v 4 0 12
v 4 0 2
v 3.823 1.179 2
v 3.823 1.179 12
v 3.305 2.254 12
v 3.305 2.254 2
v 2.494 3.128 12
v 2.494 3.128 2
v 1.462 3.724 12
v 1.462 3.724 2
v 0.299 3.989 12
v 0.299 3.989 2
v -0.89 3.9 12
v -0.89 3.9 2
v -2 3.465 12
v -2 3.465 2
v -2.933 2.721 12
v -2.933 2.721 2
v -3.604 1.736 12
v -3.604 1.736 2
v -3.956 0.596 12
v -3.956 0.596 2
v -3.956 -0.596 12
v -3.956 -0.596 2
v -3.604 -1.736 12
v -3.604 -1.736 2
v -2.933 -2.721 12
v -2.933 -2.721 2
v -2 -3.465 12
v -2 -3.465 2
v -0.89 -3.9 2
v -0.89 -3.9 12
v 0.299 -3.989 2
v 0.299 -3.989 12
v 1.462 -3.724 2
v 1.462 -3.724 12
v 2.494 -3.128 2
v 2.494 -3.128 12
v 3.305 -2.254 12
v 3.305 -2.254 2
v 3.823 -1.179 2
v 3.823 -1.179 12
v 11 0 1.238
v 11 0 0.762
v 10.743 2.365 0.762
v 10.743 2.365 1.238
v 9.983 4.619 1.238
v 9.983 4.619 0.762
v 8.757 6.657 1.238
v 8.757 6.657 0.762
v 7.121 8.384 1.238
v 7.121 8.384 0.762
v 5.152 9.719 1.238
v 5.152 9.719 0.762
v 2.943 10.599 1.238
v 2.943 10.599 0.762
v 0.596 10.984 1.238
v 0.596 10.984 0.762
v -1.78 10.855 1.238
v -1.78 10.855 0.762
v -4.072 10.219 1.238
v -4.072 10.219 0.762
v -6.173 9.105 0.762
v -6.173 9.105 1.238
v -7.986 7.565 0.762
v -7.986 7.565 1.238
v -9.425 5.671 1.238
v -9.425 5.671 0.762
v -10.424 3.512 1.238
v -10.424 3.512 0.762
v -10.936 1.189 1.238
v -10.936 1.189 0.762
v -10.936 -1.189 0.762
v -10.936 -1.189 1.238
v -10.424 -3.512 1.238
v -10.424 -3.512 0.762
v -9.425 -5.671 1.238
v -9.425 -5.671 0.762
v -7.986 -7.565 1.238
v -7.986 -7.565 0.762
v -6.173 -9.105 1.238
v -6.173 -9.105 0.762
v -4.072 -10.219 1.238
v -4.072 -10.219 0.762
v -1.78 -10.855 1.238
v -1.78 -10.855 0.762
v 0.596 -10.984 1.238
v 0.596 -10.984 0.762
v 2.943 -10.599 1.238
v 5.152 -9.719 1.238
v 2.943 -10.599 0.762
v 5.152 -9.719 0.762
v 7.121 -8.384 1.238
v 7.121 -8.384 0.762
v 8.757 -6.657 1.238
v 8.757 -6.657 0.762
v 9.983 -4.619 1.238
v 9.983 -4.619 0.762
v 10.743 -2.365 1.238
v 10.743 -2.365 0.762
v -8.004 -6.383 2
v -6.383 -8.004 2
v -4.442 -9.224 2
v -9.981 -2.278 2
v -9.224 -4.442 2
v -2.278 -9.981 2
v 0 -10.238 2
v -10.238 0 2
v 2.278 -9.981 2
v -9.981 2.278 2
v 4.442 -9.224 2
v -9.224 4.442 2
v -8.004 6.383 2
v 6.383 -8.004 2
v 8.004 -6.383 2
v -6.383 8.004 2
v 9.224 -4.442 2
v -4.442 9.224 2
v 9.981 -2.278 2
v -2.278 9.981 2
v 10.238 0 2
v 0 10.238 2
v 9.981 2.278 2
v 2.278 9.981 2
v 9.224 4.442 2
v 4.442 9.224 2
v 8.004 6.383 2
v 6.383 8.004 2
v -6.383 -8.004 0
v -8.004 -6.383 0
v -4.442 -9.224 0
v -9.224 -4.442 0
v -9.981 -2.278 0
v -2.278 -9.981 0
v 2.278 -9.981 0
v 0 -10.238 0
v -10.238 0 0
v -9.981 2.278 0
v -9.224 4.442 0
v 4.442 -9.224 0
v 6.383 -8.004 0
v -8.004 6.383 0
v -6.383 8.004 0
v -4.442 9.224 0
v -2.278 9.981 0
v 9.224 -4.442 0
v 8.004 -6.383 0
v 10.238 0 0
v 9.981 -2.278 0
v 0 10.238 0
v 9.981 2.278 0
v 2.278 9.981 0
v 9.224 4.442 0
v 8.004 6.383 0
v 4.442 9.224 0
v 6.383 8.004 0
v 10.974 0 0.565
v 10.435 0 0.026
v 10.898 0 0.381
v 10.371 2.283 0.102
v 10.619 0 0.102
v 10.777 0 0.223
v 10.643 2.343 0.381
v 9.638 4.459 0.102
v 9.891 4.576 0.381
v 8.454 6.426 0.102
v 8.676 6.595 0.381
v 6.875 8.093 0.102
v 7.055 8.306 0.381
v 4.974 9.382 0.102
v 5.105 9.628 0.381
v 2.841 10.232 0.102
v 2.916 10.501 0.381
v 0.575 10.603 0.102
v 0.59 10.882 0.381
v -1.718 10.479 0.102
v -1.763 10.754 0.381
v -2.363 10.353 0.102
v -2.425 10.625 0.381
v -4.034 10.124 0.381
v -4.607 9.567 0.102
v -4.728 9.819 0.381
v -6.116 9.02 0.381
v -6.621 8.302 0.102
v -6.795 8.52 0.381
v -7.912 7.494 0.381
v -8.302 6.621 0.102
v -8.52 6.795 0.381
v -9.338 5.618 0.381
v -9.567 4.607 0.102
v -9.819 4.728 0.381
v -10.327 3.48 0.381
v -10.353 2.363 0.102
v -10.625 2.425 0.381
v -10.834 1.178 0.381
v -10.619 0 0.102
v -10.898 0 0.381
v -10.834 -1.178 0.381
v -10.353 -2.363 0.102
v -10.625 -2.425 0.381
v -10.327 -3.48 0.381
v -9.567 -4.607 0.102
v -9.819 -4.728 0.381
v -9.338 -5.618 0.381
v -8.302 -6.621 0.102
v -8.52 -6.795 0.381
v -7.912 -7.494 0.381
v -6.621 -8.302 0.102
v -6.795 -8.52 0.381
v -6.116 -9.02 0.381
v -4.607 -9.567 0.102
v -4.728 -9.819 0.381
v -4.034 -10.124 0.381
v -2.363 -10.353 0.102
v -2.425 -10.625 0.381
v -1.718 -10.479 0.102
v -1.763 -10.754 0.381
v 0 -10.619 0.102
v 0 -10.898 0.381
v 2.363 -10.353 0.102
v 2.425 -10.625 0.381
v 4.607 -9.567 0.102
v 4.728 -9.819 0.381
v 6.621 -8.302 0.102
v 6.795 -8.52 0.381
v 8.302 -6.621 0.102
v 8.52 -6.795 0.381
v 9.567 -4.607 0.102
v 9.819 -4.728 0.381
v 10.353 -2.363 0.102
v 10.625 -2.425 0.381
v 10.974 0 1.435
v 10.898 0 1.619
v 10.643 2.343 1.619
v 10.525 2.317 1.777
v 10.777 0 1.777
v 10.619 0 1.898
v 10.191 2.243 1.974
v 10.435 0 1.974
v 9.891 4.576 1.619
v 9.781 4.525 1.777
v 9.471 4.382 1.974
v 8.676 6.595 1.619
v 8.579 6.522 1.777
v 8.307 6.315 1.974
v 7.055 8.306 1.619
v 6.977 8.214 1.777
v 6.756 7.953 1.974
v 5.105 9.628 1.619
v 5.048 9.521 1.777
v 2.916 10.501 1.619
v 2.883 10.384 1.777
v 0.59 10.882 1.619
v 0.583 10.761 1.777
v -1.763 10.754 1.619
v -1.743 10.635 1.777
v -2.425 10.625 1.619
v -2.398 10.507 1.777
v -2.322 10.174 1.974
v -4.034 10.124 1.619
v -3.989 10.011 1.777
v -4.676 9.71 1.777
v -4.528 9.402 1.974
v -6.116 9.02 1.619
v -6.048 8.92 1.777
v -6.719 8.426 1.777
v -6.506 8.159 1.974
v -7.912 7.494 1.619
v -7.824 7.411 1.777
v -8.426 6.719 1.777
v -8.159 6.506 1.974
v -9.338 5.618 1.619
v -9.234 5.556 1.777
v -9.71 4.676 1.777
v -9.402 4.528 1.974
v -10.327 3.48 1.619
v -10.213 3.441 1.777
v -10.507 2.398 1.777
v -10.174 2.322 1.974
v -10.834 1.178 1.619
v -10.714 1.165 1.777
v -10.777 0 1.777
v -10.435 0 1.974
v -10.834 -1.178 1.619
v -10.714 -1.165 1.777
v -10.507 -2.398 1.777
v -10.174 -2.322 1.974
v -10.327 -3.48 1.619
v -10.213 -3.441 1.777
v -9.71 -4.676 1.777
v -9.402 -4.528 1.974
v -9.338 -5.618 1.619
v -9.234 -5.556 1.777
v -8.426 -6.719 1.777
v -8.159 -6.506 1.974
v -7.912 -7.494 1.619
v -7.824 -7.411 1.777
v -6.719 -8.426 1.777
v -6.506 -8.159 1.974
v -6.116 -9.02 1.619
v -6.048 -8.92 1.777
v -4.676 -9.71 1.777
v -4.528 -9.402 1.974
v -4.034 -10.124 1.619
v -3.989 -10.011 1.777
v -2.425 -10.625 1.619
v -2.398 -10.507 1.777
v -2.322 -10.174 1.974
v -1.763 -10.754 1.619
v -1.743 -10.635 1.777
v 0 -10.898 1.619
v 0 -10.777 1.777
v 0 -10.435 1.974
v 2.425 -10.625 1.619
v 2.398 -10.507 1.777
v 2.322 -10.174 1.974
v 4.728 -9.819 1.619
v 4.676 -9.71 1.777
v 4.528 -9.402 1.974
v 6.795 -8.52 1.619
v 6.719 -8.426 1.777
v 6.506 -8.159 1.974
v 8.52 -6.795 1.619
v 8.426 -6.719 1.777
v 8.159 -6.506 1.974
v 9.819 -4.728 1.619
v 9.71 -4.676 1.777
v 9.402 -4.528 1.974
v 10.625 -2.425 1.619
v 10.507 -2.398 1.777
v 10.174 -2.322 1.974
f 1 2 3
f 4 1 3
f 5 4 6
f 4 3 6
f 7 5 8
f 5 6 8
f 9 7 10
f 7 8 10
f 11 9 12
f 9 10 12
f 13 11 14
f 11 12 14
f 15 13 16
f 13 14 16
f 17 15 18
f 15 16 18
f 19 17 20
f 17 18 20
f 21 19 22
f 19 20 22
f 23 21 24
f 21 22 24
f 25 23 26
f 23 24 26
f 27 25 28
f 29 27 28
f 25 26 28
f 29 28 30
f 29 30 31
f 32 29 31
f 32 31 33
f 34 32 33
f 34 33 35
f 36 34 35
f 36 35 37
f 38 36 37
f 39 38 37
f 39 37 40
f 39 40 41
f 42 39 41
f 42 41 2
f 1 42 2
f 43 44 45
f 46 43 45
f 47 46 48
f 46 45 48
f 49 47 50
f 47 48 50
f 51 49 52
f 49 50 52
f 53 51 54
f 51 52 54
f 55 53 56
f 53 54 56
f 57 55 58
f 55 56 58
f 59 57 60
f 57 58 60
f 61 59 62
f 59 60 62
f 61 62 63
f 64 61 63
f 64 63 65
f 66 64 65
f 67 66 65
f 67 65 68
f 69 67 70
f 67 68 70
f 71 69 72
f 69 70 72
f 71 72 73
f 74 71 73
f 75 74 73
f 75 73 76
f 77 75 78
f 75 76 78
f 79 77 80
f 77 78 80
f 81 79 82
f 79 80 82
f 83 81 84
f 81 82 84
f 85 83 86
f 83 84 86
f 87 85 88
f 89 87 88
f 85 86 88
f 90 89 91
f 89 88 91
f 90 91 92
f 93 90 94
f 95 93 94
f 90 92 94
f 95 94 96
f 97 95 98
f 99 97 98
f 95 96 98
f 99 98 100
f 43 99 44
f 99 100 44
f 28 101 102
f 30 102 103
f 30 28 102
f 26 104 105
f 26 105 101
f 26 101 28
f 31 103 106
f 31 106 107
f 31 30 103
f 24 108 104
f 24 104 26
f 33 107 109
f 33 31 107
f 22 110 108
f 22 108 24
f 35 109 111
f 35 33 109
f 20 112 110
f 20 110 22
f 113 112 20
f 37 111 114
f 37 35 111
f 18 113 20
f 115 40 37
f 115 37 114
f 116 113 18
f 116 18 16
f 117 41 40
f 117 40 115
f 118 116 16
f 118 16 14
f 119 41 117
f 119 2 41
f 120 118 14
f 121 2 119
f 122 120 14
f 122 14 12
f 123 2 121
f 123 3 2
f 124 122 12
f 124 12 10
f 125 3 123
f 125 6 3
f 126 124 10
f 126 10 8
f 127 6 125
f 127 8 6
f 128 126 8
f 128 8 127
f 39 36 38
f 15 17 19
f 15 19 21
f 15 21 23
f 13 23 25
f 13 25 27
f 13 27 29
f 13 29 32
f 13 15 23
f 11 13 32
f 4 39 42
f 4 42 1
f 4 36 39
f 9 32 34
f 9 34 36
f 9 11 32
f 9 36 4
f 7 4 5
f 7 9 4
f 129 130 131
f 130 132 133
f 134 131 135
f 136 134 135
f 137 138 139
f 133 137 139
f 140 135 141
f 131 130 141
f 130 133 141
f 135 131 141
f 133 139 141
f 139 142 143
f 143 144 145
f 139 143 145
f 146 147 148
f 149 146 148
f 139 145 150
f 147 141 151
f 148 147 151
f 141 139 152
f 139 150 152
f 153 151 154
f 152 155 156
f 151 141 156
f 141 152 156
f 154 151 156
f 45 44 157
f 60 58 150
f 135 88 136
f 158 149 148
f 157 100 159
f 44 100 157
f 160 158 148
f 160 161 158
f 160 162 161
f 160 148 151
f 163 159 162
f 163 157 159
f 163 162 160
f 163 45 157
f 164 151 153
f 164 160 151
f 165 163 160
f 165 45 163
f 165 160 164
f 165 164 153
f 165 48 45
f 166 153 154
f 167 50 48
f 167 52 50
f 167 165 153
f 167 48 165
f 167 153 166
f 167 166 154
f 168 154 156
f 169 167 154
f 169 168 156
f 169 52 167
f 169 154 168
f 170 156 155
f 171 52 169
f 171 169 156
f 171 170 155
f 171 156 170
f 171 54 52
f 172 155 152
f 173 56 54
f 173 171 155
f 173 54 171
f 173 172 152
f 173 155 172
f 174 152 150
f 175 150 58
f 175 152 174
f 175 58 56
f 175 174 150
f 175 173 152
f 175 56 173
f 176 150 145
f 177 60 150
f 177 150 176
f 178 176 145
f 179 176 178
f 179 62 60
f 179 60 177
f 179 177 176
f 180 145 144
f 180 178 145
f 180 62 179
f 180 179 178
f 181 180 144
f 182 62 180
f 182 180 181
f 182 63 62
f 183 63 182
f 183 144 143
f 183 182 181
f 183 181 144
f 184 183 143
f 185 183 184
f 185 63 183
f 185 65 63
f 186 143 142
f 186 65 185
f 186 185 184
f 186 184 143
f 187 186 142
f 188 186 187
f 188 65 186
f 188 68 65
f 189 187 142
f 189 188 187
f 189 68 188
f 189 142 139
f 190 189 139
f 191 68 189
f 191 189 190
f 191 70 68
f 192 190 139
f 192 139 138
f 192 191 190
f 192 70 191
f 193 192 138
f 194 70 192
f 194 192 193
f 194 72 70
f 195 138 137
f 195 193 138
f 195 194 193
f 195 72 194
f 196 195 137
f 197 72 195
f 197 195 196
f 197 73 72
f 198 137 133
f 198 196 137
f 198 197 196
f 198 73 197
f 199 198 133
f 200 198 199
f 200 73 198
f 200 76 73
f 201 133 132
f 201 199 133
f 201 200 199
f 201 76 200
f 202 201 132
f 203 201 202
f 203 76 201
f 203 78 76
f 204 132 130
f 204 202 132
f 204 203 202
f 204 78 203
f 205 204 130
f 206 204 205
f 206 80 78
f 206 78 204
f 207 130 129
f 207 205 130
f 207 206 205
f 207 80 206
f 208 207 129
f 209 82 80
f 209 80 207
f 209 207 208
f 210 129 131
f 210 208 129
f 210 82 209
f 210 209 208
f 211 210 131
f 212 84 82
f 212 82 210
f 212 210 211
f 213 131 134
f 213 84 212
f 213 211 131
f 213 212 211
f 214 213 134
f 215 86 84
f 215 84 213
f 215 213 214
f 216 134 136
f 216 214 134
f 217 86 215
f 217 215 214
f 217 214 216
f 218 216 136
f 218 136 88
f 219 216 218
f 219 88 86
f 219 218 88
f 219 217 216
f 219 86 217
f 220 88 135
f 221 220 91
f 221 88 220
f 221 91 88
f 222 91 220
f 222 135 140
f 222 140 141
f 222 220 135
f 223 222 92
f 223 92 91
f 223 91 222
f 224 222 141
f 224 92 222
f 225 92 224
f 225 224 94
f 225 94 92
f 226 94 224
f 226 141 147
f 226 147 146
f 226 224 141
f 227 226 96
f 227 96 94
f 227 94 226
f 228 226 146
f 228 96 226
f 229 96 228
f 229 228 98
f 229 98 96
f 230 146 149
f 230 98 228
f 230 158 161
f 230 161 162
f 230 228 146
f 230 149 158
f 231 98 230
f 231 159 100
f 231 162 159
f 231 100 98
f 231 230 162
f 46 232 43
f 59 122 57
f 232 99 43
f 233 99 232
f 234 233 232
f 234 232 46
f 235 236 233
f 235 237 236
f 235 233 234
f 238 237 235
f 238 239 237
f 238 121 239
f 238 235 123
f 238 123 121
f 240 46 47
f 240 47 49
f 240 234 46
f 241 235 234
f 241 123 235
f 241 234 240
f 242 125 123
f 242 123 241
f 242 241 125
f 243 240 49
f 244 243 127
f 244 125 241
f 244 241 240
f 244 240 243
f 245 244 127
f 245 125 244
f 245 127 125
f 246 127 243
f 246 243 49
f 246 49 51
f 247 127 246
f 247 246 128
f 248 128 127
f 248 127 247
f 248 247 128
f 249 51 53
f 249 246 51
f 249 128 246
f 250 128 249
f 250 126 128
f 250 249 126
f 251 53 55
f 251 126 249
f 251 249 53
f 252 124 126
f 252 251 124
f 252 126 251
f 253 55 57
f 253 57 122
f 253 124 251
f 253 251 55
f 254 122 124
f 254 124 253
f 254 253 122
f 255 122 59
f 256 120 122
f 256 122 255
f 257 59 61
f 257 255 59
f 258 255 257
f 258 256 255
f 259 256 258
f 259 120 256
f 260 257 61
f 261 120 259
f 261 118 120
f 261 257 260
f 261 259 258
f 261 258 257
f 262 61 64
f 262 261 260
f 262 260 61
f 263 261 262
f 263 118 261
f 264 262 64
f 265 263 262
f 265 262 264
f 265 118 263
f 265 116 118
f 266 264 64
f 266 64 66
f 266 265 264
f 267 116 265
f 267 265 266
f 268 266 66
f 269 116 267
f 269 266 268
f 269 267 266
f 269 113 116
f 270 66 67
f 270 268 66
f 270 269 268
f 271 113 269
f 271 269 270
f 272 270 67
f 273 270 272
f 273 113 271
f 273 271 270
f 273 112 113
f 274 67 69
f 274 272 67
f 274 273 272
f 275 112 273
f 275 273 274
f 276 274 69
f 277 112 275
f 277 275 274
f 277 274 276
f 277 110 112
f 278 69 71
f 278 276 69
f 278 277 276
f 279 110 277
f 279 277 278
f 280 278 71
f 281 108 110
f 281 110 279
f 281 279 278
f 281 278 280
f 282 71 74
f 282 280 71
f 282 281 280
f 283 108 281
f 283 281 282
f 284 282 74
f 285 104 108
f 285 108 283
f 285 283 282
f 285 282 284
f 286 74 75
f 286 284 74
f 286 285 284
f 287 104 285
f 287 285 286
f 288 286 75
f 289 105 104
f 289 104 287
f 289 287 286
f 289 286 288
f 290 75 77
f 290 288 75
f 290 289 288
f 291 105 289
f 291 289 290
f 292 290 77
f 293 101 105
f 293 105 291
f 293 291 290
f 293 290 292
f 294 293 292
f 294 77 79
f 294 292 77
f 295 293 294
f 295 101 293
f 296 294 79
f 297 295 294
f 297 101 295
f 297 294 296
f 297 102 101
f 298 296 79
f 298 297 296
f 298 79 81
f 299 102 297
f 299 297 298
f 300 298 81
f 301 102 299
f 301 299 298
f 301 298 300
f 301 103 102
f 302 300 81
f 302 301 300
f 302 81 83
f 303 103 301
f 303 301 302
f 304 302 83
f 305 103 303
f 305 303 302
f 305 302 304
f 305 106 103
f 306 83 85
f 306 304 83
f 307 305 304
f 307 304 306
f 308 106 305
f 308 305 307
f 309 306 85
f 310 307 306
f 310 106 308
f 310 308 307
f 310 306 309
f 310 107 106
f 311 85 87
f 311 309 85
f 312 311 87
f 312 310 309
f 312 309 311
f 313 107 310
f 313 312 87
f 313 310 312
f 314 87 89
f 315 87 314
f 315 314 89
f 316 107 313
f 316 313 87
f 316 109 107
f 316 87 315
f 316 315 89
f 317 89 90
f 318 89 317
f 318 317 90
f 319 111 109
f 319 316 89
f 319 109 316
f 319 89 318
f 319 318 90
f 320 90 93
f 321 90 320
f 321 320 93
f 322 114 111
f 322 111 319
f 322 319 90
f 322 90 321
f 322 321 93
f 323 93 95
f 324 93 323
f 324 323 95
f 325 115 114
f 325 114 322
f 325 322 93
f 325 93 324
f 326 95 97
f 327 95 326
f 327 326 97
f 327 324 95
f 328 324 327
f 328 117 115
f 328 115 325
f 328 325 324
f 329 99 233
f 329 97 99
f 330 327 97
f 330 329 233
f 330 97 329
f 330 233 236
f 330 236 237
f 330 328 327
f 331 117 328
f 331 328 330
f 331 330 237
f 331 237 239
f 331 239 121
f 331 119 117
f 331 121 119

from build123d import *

# Parameters (mm, degrees)
F0_R     = 11
F1_DEPTH = 2
F2_R     = 4.0005
F3_DEPTH = 12
F4_R     = 0.762


with BuildPart() as f1:
    # F0 (on Top) → F1 (new body)
    with BuildSketch(Plane.XY):
        Circle(F0_R)
    extrude(amount=F1_DEPTH)

    # F2 (on Top) → F3 (join)
    with BuildSketch(Plane.XY):
        Circle(F2_R)
    extrude(amount=F3_DEPTH)

    # F4
    f4_edges = [f1.edges().sort_by_distance(p)[0] for p in [
        (-11, 0, 2),
        (11, 0, 1),
        (-11, 0, 0),
    ]]
    fillet(f4_edges, radius=F4_R)


solid = f1.part
